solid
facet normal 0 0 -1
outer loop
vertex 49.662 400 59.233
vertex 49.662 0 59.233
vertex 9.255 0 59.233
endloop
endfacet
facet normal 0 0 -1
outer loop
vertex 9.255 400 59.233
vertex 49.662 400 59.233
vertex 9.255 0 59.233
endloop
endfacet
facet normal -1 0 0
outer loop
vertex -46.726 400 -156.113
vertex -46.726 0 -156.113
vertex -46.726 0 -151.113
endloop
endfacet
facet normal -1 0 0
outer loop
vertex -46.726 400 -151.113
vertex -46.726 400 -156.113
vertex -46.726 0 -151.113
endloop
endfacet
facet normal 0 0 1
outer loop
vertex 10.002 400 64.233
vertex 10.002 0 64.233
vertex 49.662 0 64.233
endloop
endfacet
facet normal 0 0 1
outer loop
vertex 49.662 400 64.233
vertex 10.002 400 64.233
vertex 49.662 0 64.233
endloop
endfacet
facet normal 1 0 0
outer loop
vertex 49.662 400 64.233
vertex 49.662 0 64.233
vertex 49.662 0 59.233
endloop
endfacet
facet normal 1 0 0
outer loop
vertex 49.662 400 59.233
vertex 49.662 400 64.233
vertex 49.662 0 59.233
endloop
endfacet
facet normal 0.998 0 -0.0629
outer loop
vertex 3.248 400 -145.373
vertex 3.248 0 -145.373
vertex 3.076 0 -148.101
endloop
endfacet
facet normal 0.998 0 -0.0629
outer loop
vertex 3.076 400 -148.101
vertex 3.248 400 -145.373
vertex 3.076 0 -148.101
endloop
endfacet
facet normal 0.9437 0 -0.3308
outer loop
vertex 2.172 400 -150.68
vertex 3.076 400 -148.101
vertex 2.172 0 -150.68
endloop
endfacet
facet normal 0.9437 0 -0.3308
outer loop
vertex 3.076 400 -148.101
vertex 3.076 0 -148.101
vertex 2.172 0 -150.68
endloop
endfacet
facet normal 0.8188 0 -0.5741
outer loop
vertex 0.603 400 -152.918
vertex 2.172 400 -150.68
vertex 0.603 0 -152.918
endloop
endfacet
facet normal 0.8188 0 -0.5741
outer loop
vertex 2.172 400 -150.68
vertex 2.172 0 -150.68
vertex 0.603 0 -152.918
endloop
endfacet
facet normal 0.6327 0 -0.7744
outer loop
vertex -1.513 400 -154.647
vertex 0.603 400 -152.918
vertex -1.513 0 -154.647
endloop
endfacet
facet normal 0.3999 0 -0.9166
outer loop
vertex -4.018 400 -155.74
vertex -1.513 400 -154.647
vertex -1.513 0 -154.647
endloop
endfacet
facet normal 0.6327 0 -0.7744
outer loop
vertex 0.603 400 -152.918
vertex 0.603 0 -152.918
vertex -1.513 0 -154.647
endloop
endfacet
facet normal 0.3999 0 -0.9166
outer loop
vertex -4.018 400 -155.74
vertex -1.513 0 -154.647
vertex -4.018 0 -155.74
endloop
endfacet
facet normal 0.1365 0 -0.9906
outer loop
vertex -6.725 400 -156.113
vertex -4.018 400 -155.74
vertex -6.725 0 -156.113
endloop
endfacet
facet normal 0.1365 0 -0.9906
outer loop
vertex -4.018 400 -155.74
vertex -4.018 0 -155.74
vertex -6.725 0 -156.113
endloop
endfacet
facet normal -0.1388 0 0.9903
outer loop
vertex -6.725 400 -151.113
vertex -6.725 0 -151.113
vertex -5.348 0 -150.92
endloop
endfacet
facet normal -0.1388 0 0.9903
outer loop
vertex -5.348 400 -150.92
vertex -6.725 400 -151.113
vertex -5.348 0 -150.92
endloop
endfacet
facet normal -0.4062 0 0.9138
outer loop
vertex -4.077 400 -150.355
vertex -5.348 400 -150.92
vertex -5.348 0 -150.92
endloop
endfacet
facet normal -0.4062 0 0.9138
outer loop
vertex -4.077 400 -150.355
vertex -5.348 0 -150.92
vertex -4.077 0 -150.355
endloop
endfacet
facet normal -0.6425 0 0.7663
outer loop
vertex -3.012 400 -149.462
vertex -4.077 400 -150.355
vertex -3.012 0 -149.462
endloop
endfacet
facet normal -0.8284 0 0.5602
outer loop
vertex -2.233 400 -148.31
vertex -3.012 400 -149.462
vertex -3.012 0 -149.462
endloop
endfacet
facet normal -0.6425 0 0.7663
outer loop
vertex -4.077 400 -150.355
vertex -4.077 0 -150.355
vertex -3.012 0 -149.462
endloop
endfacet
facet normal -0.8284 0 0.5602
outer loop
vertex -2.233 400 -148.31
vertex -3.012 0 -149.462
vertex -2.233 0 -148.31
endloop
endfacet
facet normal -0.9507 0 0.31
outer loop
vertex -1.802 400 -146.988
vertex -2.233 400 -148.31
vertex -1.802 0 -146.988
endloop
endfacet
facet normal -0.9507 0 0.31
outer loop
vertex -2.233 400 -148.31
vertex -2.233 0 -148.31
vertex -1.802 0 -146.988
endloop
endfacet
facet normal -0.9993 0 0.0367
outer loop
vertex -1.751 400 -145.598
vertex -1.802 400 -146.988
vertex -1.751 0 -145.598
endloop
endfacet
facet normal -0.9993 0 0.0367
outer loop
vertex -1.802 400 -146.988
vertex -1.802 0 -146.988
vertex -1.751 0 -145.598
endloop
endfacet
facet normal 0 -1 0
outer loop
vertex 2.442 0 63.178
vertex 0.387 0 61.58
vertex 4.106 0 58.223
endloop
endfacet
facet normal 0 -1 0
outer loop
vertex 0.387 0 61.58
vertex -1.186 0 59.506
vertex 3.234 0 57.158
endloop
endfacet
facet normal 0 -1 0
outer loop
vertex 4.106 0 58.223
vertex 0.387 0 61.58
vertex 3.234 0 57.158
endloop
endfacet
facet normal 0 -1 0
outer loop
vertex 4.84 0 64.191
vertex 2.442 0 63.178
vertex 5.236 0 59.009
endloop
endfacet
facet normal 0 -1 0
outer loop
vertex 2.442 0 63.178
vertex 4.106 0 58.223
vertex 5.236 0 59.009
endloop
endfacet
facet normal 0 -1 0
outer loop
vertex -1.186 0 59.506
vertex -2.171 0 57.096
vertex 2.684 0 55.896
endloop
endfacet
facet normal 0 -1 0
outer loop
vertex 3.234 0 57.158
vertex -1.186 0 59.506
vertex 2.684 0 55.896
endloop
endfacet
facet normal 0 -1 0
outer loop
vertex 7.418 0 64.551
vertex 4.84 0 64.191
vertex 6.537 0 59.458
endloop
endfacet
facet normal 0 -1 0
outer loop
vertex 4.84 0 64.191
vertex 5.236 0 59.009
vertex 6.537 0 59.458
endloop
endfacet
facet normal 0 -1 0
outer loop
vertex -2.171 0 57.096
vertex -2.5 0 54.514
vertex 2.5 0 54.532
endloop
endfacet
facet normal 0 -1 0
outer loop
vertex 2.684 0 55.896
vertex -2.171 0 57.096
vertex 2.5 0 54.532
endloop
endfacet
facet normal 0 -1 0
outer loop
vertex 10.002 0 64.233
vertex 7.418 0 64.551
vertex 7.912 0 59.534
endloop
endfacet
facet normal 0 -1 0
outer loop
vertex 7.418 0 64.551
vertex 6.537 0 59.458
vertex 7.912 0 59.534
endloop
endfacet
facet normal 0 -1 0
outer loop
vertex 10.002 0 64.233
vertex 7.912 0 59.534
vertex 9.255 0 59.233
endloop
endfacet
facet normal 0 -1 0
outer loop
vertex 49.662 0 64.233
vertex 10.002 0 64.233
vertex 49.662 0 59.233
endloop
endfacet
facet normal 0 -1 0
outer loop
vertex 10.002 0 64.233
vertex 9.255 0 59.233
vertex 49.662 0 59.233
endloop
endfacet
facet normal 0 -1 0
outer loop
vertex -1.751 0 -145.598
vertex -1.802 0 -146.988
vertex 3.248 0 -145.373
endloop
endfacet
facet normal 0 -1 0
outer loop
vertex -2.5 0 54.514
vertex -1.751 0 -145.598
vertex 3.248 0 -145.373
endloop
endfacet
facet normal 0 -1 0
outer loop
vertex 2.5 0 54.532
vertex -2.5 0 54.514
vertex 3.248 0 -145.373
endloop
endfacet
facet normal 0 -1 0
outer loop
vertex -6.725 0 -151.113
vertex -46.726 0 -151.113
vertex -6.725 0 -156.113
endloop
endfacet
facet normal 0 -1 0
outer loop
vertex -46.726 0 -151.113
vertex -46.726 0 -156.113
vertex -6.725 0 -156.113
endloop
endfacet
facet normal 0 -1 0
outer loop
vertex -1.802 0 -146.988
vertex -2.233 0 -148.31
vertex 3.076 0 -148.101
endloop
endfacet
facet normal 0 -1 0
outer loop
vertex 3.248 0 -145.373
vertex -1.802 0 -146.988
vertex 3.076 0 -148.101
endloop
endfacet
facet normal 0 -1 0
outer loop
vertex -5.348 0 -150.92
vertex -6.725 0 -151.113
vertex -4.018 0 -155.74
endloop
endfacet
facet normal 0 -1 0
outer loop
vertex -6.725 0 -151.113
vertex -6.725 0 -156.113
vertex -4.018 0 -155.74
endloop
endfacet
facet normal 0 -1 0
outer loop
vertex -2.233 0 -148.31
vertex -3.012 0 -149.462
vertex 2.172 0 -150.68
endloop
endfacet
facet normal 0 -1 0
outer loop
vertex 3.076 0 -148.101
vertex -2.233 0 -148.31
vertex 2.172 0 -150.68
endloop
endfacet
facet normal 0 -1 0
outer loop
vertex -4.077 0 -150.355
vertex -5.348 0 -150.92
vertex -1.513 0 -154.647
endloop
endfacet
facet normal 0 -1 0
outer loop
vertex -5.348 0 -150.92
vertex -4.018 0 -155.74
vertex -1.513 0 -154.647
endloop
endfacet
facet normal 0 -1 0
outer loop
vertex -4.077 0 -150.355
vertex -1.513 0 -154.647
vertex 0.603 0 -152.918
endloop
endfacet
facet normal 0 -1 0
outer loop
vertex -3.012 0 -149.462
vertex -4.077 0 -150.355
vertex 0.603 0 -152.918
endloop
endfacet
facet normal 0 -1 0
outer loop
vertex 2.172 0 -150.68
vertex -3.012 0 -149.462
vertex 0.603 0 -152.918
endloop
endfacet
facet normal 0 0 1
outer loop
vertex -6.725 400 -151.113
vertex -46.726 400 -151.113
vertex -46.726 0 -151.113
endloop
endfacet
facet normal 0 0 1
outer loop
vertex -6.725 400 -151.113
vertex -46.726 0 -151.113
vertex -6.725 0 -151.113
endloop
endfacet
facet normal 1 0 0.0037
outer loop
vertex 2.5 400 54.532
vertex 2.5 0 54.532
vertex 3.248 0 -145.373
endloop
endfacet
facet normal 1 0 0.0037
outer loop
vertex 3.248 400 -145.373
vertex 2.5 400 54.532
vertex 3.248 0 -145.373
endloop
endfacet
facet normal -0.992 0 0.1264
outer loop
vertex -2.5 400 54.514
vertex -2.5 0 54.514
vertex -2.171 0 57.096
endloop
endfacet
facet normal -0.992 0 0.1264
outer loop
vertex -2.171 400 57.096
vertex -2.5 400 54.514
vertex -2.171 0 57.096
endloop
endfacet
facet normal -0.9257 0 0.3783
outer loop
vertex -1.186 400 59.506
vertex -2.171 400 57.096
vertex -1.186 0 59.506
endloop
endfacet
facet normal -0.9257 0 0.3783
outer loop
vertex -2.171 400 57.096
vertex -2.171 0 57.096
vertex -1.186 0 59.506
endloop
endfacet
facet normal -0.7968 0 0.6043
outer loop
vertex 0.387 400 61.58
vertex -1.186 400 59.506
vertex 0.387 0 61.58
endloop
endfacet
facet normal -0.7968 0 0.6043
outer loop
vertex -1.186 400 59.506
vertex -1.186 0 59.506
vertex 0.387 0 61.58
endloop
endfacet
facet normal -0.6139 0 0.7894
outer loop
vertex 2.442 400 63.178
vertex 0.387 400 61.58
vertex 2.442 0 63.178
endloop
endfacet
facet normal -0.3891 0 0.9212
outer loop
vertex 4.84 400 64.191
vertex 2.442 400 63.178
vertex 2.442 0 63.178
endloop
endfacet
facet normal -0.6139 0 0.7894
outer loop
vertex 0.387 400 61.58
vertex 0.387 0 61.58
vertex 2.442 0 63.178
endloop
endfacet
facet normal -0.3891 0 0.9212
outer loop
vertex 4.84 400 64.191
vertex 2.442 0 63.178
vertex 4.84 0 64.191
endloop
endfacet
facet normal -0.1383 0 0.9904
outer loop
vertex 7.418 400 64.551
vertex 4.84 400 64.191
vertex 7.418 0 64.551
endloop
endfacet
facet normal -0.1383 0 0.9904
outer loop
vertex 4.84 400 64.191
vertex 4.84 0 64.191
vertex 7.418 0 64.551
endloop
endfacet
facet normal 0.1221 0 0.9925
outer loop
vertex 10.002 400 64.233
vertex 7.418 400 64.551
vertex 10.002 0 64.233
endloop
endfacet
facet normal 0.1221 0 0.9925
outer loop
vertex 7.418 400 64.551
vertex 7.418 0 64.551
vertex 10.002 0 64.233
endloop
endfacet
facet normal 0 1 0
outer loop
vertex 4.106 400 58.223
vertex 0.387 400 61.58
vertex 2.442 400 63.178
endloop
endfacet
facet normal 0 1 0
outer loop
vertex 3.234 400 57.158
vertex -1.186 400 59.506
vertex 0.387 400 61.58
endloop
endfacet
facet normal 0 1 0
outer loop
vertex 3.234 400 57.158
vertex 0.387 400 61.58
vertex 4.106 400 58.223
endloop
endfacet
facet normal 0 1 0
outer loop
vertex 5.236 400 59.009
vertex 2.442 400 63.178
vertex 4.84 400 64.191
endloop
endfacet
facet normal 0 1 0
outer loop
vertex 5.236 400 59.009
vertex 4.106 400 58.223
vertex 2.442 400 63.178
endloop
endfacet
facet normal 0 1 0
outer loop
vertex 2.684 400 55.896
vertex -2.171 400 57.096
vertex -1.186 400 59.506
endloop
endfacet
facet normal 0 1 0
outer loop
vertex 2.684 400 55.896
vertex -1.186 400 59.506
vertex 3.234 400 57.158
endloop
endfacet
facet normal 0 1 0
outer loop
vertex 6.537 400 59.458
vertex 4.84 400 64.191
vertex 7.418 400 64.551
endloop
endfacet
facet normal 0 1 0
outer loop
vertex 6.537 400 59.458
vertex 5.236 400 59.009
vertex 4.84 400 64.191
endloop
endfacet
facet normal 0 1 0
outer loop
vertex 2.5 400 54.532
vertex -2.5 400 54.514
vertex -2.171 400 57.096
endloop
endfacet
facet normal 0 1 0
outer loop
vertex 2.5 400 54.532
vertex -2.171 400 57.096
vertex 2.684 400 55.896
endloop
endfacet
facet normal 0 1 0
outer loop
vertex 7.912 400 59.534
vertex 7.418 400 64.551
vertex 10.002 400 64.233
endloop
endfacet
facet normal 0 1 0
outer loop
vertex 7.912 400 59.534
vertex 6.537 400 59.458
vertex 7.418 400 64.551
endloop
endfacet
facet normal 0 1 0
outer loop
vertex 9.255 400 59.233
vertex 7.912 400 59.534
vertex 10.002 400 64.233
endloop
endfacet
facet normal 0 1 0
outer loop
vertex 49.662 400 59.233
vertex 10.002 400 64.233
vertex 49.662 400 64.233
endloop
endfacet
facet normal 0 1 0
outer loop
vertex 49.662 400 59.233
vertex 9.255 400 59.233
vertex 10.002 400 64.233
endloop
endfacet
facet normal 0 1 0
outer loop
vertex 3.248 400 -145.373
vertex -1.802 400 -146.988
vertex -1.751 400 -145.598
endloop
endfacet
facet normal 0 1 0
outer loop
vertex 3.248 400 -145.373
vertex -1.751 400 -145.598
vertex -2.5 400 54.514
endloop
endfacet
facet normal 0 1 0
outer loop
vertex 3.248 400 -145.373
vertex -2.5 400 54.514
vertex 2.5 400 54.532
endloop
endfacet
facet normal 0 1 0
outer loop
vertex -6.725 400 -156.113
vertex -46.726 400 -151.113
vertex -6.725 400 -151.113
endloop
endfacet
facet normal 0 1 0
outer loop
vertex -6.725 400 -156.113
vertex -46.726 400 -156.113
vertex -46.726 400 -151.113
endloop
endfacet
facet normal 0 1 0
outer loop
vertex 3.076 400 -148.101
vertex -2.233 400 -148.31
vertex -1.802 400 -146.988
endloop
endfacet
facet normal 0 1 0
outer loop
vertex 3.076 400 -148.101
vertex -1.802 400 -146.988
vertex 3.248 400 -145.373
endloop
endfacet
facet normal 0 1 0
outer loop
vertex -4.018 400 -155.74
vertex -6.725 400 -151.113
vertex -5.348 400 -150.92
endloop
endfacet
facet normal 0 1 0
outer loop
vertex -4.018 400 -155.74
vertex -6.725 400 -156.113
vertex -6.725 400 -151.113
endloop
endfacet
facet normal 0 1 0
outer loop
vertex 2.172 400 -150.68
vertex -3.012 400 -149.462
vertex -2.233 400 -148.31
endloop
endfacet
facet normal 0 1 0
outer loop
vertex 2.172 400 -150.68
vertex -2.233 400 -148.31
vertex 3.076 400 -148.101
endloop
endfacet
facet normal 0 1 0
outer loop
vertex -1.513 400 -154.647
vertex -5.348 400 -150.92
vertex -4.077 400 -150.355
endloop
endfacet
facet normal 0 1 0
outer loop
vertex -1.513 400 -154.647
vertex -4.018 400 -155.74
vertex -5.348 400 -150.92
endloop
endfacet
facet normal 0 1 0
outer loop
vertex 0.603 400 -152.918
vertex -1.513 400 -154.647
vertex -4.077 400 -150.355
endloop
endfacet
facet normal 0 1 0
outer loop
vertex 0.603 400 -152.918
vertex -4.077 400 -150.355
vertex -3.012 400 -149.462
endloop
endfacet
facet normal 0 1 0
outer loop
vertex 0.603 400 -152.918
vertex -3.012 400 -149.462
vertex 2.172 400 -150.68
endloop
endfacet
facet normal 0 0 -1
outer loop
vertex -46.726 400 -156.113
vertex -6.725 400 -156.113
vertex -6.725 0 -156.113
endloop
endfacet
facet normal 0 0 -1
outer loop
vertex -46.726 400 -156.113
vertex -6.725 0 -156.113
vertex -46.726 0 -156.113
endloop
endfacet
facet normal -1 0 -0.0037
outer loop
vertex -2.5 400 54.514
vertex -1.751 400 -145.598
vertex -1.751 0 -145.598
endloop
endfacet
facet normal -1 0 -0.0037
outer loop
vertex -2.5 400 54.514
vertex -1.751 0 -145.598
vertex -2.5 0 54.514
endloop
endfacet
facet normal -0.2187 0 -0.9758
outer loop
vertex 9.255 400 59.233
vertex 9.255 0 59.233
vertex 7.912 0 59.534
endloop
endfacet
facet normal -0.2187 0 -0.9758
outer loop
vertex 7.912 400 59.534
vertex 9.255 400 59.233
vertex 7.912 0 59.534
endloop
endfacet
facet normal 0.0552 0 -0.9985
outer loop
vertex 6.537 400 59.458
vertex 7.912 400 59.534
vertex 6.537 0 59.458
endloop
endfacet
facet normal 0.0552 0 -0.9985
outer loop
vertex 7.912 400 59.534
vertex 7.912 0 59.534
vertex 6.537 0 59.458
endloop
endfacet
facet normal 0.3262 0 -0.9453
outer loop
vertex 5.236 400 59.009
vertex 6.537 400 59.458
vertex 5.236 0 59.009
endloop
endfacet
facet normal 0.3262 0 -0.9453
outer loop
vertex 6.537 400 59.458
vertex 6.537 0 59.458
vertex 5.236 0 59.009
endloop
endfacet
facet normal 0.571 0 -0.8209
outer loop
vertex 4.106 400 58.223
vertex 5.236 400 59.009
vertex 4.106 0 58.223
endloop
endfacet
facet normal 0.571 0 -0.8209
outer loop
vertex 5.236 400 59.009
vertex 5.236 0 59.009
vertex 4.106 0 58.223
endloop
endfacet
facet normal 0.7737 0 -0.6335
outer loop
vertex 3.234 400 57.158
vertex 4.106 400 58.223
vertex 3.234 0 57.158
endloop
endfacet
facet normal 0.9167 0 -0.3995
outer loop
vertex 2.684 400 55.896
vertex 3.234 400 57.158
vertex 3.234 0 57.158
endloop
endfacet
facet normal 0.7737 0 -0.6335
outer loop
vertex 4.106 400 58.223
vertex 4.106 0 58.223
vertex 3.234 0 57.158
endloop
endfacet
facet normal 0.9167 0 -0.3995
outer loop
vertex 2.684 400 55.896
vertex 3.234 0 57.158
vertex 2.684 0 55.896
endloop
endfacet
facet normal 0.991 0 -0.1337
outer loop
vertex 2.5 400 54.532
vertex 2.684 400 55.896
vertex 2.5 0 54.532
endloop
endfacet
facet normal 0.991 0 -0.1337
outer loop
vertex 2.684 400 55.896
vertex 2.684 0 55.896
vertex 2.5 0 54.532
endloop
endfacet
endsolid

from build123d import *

# Parameters (mm, degrees)
EXTRUDE_THIN1_DEPTH = 400


with BuildPart() as part:
    # Sketch1 → Extrude-Thin1 (new body)
    with BuildSketch(Plane(origin=(0, 0, 0), x_dir=(1, 0, 0), z_dir=(0, 1, 0))):
        with BuildLine():
            Line((-46.726101212, 151.113189738), (-6.724981576, 151.113189738))
            ThreePointArc((-6.724981576, 151.113189738), (-3.011728055, 149.461688161), (-1.751349164, 145.598120611))
            Line((-1.751349164, 145.598120611), (-2.499982506, -54.513654379))
            ThreePointArc((-2.499982506, -54.513654379), (1.362139111, -62.445932955), (10.001711114, -64.233339564))
            Line((10.001711114, -64.233339564), (49.661853535, -64.233339564))
            Line((49.661853535, -64.233339564), (49.661853535, -59.233339564))
            Line((49.661853535, -59.233339564), (9.254697404, -59.233339564))
            ThreePointArc((9.254697404, -59.233339564), (4.6438767, -58.655180628), (2.499982506, -54.532359627))
            Line((2.499982506, -54.532359627), (3.247845267, 145.373437083))
            ThreePointArc((3.247845267, 145.373437083), (0.603039342, 152.9177067), (-6.724981576, 156.113189738))
            Line((-6.724981576, 156.113189738), (-46.726101212, 156.113189738))
            Line((-46.726101212, 156.113189738), (-46.726101212, 151.113189738))
        make_face()
    extrude(amount=EXTRUDE_THIN1_DEPTH)


solid = part.part
